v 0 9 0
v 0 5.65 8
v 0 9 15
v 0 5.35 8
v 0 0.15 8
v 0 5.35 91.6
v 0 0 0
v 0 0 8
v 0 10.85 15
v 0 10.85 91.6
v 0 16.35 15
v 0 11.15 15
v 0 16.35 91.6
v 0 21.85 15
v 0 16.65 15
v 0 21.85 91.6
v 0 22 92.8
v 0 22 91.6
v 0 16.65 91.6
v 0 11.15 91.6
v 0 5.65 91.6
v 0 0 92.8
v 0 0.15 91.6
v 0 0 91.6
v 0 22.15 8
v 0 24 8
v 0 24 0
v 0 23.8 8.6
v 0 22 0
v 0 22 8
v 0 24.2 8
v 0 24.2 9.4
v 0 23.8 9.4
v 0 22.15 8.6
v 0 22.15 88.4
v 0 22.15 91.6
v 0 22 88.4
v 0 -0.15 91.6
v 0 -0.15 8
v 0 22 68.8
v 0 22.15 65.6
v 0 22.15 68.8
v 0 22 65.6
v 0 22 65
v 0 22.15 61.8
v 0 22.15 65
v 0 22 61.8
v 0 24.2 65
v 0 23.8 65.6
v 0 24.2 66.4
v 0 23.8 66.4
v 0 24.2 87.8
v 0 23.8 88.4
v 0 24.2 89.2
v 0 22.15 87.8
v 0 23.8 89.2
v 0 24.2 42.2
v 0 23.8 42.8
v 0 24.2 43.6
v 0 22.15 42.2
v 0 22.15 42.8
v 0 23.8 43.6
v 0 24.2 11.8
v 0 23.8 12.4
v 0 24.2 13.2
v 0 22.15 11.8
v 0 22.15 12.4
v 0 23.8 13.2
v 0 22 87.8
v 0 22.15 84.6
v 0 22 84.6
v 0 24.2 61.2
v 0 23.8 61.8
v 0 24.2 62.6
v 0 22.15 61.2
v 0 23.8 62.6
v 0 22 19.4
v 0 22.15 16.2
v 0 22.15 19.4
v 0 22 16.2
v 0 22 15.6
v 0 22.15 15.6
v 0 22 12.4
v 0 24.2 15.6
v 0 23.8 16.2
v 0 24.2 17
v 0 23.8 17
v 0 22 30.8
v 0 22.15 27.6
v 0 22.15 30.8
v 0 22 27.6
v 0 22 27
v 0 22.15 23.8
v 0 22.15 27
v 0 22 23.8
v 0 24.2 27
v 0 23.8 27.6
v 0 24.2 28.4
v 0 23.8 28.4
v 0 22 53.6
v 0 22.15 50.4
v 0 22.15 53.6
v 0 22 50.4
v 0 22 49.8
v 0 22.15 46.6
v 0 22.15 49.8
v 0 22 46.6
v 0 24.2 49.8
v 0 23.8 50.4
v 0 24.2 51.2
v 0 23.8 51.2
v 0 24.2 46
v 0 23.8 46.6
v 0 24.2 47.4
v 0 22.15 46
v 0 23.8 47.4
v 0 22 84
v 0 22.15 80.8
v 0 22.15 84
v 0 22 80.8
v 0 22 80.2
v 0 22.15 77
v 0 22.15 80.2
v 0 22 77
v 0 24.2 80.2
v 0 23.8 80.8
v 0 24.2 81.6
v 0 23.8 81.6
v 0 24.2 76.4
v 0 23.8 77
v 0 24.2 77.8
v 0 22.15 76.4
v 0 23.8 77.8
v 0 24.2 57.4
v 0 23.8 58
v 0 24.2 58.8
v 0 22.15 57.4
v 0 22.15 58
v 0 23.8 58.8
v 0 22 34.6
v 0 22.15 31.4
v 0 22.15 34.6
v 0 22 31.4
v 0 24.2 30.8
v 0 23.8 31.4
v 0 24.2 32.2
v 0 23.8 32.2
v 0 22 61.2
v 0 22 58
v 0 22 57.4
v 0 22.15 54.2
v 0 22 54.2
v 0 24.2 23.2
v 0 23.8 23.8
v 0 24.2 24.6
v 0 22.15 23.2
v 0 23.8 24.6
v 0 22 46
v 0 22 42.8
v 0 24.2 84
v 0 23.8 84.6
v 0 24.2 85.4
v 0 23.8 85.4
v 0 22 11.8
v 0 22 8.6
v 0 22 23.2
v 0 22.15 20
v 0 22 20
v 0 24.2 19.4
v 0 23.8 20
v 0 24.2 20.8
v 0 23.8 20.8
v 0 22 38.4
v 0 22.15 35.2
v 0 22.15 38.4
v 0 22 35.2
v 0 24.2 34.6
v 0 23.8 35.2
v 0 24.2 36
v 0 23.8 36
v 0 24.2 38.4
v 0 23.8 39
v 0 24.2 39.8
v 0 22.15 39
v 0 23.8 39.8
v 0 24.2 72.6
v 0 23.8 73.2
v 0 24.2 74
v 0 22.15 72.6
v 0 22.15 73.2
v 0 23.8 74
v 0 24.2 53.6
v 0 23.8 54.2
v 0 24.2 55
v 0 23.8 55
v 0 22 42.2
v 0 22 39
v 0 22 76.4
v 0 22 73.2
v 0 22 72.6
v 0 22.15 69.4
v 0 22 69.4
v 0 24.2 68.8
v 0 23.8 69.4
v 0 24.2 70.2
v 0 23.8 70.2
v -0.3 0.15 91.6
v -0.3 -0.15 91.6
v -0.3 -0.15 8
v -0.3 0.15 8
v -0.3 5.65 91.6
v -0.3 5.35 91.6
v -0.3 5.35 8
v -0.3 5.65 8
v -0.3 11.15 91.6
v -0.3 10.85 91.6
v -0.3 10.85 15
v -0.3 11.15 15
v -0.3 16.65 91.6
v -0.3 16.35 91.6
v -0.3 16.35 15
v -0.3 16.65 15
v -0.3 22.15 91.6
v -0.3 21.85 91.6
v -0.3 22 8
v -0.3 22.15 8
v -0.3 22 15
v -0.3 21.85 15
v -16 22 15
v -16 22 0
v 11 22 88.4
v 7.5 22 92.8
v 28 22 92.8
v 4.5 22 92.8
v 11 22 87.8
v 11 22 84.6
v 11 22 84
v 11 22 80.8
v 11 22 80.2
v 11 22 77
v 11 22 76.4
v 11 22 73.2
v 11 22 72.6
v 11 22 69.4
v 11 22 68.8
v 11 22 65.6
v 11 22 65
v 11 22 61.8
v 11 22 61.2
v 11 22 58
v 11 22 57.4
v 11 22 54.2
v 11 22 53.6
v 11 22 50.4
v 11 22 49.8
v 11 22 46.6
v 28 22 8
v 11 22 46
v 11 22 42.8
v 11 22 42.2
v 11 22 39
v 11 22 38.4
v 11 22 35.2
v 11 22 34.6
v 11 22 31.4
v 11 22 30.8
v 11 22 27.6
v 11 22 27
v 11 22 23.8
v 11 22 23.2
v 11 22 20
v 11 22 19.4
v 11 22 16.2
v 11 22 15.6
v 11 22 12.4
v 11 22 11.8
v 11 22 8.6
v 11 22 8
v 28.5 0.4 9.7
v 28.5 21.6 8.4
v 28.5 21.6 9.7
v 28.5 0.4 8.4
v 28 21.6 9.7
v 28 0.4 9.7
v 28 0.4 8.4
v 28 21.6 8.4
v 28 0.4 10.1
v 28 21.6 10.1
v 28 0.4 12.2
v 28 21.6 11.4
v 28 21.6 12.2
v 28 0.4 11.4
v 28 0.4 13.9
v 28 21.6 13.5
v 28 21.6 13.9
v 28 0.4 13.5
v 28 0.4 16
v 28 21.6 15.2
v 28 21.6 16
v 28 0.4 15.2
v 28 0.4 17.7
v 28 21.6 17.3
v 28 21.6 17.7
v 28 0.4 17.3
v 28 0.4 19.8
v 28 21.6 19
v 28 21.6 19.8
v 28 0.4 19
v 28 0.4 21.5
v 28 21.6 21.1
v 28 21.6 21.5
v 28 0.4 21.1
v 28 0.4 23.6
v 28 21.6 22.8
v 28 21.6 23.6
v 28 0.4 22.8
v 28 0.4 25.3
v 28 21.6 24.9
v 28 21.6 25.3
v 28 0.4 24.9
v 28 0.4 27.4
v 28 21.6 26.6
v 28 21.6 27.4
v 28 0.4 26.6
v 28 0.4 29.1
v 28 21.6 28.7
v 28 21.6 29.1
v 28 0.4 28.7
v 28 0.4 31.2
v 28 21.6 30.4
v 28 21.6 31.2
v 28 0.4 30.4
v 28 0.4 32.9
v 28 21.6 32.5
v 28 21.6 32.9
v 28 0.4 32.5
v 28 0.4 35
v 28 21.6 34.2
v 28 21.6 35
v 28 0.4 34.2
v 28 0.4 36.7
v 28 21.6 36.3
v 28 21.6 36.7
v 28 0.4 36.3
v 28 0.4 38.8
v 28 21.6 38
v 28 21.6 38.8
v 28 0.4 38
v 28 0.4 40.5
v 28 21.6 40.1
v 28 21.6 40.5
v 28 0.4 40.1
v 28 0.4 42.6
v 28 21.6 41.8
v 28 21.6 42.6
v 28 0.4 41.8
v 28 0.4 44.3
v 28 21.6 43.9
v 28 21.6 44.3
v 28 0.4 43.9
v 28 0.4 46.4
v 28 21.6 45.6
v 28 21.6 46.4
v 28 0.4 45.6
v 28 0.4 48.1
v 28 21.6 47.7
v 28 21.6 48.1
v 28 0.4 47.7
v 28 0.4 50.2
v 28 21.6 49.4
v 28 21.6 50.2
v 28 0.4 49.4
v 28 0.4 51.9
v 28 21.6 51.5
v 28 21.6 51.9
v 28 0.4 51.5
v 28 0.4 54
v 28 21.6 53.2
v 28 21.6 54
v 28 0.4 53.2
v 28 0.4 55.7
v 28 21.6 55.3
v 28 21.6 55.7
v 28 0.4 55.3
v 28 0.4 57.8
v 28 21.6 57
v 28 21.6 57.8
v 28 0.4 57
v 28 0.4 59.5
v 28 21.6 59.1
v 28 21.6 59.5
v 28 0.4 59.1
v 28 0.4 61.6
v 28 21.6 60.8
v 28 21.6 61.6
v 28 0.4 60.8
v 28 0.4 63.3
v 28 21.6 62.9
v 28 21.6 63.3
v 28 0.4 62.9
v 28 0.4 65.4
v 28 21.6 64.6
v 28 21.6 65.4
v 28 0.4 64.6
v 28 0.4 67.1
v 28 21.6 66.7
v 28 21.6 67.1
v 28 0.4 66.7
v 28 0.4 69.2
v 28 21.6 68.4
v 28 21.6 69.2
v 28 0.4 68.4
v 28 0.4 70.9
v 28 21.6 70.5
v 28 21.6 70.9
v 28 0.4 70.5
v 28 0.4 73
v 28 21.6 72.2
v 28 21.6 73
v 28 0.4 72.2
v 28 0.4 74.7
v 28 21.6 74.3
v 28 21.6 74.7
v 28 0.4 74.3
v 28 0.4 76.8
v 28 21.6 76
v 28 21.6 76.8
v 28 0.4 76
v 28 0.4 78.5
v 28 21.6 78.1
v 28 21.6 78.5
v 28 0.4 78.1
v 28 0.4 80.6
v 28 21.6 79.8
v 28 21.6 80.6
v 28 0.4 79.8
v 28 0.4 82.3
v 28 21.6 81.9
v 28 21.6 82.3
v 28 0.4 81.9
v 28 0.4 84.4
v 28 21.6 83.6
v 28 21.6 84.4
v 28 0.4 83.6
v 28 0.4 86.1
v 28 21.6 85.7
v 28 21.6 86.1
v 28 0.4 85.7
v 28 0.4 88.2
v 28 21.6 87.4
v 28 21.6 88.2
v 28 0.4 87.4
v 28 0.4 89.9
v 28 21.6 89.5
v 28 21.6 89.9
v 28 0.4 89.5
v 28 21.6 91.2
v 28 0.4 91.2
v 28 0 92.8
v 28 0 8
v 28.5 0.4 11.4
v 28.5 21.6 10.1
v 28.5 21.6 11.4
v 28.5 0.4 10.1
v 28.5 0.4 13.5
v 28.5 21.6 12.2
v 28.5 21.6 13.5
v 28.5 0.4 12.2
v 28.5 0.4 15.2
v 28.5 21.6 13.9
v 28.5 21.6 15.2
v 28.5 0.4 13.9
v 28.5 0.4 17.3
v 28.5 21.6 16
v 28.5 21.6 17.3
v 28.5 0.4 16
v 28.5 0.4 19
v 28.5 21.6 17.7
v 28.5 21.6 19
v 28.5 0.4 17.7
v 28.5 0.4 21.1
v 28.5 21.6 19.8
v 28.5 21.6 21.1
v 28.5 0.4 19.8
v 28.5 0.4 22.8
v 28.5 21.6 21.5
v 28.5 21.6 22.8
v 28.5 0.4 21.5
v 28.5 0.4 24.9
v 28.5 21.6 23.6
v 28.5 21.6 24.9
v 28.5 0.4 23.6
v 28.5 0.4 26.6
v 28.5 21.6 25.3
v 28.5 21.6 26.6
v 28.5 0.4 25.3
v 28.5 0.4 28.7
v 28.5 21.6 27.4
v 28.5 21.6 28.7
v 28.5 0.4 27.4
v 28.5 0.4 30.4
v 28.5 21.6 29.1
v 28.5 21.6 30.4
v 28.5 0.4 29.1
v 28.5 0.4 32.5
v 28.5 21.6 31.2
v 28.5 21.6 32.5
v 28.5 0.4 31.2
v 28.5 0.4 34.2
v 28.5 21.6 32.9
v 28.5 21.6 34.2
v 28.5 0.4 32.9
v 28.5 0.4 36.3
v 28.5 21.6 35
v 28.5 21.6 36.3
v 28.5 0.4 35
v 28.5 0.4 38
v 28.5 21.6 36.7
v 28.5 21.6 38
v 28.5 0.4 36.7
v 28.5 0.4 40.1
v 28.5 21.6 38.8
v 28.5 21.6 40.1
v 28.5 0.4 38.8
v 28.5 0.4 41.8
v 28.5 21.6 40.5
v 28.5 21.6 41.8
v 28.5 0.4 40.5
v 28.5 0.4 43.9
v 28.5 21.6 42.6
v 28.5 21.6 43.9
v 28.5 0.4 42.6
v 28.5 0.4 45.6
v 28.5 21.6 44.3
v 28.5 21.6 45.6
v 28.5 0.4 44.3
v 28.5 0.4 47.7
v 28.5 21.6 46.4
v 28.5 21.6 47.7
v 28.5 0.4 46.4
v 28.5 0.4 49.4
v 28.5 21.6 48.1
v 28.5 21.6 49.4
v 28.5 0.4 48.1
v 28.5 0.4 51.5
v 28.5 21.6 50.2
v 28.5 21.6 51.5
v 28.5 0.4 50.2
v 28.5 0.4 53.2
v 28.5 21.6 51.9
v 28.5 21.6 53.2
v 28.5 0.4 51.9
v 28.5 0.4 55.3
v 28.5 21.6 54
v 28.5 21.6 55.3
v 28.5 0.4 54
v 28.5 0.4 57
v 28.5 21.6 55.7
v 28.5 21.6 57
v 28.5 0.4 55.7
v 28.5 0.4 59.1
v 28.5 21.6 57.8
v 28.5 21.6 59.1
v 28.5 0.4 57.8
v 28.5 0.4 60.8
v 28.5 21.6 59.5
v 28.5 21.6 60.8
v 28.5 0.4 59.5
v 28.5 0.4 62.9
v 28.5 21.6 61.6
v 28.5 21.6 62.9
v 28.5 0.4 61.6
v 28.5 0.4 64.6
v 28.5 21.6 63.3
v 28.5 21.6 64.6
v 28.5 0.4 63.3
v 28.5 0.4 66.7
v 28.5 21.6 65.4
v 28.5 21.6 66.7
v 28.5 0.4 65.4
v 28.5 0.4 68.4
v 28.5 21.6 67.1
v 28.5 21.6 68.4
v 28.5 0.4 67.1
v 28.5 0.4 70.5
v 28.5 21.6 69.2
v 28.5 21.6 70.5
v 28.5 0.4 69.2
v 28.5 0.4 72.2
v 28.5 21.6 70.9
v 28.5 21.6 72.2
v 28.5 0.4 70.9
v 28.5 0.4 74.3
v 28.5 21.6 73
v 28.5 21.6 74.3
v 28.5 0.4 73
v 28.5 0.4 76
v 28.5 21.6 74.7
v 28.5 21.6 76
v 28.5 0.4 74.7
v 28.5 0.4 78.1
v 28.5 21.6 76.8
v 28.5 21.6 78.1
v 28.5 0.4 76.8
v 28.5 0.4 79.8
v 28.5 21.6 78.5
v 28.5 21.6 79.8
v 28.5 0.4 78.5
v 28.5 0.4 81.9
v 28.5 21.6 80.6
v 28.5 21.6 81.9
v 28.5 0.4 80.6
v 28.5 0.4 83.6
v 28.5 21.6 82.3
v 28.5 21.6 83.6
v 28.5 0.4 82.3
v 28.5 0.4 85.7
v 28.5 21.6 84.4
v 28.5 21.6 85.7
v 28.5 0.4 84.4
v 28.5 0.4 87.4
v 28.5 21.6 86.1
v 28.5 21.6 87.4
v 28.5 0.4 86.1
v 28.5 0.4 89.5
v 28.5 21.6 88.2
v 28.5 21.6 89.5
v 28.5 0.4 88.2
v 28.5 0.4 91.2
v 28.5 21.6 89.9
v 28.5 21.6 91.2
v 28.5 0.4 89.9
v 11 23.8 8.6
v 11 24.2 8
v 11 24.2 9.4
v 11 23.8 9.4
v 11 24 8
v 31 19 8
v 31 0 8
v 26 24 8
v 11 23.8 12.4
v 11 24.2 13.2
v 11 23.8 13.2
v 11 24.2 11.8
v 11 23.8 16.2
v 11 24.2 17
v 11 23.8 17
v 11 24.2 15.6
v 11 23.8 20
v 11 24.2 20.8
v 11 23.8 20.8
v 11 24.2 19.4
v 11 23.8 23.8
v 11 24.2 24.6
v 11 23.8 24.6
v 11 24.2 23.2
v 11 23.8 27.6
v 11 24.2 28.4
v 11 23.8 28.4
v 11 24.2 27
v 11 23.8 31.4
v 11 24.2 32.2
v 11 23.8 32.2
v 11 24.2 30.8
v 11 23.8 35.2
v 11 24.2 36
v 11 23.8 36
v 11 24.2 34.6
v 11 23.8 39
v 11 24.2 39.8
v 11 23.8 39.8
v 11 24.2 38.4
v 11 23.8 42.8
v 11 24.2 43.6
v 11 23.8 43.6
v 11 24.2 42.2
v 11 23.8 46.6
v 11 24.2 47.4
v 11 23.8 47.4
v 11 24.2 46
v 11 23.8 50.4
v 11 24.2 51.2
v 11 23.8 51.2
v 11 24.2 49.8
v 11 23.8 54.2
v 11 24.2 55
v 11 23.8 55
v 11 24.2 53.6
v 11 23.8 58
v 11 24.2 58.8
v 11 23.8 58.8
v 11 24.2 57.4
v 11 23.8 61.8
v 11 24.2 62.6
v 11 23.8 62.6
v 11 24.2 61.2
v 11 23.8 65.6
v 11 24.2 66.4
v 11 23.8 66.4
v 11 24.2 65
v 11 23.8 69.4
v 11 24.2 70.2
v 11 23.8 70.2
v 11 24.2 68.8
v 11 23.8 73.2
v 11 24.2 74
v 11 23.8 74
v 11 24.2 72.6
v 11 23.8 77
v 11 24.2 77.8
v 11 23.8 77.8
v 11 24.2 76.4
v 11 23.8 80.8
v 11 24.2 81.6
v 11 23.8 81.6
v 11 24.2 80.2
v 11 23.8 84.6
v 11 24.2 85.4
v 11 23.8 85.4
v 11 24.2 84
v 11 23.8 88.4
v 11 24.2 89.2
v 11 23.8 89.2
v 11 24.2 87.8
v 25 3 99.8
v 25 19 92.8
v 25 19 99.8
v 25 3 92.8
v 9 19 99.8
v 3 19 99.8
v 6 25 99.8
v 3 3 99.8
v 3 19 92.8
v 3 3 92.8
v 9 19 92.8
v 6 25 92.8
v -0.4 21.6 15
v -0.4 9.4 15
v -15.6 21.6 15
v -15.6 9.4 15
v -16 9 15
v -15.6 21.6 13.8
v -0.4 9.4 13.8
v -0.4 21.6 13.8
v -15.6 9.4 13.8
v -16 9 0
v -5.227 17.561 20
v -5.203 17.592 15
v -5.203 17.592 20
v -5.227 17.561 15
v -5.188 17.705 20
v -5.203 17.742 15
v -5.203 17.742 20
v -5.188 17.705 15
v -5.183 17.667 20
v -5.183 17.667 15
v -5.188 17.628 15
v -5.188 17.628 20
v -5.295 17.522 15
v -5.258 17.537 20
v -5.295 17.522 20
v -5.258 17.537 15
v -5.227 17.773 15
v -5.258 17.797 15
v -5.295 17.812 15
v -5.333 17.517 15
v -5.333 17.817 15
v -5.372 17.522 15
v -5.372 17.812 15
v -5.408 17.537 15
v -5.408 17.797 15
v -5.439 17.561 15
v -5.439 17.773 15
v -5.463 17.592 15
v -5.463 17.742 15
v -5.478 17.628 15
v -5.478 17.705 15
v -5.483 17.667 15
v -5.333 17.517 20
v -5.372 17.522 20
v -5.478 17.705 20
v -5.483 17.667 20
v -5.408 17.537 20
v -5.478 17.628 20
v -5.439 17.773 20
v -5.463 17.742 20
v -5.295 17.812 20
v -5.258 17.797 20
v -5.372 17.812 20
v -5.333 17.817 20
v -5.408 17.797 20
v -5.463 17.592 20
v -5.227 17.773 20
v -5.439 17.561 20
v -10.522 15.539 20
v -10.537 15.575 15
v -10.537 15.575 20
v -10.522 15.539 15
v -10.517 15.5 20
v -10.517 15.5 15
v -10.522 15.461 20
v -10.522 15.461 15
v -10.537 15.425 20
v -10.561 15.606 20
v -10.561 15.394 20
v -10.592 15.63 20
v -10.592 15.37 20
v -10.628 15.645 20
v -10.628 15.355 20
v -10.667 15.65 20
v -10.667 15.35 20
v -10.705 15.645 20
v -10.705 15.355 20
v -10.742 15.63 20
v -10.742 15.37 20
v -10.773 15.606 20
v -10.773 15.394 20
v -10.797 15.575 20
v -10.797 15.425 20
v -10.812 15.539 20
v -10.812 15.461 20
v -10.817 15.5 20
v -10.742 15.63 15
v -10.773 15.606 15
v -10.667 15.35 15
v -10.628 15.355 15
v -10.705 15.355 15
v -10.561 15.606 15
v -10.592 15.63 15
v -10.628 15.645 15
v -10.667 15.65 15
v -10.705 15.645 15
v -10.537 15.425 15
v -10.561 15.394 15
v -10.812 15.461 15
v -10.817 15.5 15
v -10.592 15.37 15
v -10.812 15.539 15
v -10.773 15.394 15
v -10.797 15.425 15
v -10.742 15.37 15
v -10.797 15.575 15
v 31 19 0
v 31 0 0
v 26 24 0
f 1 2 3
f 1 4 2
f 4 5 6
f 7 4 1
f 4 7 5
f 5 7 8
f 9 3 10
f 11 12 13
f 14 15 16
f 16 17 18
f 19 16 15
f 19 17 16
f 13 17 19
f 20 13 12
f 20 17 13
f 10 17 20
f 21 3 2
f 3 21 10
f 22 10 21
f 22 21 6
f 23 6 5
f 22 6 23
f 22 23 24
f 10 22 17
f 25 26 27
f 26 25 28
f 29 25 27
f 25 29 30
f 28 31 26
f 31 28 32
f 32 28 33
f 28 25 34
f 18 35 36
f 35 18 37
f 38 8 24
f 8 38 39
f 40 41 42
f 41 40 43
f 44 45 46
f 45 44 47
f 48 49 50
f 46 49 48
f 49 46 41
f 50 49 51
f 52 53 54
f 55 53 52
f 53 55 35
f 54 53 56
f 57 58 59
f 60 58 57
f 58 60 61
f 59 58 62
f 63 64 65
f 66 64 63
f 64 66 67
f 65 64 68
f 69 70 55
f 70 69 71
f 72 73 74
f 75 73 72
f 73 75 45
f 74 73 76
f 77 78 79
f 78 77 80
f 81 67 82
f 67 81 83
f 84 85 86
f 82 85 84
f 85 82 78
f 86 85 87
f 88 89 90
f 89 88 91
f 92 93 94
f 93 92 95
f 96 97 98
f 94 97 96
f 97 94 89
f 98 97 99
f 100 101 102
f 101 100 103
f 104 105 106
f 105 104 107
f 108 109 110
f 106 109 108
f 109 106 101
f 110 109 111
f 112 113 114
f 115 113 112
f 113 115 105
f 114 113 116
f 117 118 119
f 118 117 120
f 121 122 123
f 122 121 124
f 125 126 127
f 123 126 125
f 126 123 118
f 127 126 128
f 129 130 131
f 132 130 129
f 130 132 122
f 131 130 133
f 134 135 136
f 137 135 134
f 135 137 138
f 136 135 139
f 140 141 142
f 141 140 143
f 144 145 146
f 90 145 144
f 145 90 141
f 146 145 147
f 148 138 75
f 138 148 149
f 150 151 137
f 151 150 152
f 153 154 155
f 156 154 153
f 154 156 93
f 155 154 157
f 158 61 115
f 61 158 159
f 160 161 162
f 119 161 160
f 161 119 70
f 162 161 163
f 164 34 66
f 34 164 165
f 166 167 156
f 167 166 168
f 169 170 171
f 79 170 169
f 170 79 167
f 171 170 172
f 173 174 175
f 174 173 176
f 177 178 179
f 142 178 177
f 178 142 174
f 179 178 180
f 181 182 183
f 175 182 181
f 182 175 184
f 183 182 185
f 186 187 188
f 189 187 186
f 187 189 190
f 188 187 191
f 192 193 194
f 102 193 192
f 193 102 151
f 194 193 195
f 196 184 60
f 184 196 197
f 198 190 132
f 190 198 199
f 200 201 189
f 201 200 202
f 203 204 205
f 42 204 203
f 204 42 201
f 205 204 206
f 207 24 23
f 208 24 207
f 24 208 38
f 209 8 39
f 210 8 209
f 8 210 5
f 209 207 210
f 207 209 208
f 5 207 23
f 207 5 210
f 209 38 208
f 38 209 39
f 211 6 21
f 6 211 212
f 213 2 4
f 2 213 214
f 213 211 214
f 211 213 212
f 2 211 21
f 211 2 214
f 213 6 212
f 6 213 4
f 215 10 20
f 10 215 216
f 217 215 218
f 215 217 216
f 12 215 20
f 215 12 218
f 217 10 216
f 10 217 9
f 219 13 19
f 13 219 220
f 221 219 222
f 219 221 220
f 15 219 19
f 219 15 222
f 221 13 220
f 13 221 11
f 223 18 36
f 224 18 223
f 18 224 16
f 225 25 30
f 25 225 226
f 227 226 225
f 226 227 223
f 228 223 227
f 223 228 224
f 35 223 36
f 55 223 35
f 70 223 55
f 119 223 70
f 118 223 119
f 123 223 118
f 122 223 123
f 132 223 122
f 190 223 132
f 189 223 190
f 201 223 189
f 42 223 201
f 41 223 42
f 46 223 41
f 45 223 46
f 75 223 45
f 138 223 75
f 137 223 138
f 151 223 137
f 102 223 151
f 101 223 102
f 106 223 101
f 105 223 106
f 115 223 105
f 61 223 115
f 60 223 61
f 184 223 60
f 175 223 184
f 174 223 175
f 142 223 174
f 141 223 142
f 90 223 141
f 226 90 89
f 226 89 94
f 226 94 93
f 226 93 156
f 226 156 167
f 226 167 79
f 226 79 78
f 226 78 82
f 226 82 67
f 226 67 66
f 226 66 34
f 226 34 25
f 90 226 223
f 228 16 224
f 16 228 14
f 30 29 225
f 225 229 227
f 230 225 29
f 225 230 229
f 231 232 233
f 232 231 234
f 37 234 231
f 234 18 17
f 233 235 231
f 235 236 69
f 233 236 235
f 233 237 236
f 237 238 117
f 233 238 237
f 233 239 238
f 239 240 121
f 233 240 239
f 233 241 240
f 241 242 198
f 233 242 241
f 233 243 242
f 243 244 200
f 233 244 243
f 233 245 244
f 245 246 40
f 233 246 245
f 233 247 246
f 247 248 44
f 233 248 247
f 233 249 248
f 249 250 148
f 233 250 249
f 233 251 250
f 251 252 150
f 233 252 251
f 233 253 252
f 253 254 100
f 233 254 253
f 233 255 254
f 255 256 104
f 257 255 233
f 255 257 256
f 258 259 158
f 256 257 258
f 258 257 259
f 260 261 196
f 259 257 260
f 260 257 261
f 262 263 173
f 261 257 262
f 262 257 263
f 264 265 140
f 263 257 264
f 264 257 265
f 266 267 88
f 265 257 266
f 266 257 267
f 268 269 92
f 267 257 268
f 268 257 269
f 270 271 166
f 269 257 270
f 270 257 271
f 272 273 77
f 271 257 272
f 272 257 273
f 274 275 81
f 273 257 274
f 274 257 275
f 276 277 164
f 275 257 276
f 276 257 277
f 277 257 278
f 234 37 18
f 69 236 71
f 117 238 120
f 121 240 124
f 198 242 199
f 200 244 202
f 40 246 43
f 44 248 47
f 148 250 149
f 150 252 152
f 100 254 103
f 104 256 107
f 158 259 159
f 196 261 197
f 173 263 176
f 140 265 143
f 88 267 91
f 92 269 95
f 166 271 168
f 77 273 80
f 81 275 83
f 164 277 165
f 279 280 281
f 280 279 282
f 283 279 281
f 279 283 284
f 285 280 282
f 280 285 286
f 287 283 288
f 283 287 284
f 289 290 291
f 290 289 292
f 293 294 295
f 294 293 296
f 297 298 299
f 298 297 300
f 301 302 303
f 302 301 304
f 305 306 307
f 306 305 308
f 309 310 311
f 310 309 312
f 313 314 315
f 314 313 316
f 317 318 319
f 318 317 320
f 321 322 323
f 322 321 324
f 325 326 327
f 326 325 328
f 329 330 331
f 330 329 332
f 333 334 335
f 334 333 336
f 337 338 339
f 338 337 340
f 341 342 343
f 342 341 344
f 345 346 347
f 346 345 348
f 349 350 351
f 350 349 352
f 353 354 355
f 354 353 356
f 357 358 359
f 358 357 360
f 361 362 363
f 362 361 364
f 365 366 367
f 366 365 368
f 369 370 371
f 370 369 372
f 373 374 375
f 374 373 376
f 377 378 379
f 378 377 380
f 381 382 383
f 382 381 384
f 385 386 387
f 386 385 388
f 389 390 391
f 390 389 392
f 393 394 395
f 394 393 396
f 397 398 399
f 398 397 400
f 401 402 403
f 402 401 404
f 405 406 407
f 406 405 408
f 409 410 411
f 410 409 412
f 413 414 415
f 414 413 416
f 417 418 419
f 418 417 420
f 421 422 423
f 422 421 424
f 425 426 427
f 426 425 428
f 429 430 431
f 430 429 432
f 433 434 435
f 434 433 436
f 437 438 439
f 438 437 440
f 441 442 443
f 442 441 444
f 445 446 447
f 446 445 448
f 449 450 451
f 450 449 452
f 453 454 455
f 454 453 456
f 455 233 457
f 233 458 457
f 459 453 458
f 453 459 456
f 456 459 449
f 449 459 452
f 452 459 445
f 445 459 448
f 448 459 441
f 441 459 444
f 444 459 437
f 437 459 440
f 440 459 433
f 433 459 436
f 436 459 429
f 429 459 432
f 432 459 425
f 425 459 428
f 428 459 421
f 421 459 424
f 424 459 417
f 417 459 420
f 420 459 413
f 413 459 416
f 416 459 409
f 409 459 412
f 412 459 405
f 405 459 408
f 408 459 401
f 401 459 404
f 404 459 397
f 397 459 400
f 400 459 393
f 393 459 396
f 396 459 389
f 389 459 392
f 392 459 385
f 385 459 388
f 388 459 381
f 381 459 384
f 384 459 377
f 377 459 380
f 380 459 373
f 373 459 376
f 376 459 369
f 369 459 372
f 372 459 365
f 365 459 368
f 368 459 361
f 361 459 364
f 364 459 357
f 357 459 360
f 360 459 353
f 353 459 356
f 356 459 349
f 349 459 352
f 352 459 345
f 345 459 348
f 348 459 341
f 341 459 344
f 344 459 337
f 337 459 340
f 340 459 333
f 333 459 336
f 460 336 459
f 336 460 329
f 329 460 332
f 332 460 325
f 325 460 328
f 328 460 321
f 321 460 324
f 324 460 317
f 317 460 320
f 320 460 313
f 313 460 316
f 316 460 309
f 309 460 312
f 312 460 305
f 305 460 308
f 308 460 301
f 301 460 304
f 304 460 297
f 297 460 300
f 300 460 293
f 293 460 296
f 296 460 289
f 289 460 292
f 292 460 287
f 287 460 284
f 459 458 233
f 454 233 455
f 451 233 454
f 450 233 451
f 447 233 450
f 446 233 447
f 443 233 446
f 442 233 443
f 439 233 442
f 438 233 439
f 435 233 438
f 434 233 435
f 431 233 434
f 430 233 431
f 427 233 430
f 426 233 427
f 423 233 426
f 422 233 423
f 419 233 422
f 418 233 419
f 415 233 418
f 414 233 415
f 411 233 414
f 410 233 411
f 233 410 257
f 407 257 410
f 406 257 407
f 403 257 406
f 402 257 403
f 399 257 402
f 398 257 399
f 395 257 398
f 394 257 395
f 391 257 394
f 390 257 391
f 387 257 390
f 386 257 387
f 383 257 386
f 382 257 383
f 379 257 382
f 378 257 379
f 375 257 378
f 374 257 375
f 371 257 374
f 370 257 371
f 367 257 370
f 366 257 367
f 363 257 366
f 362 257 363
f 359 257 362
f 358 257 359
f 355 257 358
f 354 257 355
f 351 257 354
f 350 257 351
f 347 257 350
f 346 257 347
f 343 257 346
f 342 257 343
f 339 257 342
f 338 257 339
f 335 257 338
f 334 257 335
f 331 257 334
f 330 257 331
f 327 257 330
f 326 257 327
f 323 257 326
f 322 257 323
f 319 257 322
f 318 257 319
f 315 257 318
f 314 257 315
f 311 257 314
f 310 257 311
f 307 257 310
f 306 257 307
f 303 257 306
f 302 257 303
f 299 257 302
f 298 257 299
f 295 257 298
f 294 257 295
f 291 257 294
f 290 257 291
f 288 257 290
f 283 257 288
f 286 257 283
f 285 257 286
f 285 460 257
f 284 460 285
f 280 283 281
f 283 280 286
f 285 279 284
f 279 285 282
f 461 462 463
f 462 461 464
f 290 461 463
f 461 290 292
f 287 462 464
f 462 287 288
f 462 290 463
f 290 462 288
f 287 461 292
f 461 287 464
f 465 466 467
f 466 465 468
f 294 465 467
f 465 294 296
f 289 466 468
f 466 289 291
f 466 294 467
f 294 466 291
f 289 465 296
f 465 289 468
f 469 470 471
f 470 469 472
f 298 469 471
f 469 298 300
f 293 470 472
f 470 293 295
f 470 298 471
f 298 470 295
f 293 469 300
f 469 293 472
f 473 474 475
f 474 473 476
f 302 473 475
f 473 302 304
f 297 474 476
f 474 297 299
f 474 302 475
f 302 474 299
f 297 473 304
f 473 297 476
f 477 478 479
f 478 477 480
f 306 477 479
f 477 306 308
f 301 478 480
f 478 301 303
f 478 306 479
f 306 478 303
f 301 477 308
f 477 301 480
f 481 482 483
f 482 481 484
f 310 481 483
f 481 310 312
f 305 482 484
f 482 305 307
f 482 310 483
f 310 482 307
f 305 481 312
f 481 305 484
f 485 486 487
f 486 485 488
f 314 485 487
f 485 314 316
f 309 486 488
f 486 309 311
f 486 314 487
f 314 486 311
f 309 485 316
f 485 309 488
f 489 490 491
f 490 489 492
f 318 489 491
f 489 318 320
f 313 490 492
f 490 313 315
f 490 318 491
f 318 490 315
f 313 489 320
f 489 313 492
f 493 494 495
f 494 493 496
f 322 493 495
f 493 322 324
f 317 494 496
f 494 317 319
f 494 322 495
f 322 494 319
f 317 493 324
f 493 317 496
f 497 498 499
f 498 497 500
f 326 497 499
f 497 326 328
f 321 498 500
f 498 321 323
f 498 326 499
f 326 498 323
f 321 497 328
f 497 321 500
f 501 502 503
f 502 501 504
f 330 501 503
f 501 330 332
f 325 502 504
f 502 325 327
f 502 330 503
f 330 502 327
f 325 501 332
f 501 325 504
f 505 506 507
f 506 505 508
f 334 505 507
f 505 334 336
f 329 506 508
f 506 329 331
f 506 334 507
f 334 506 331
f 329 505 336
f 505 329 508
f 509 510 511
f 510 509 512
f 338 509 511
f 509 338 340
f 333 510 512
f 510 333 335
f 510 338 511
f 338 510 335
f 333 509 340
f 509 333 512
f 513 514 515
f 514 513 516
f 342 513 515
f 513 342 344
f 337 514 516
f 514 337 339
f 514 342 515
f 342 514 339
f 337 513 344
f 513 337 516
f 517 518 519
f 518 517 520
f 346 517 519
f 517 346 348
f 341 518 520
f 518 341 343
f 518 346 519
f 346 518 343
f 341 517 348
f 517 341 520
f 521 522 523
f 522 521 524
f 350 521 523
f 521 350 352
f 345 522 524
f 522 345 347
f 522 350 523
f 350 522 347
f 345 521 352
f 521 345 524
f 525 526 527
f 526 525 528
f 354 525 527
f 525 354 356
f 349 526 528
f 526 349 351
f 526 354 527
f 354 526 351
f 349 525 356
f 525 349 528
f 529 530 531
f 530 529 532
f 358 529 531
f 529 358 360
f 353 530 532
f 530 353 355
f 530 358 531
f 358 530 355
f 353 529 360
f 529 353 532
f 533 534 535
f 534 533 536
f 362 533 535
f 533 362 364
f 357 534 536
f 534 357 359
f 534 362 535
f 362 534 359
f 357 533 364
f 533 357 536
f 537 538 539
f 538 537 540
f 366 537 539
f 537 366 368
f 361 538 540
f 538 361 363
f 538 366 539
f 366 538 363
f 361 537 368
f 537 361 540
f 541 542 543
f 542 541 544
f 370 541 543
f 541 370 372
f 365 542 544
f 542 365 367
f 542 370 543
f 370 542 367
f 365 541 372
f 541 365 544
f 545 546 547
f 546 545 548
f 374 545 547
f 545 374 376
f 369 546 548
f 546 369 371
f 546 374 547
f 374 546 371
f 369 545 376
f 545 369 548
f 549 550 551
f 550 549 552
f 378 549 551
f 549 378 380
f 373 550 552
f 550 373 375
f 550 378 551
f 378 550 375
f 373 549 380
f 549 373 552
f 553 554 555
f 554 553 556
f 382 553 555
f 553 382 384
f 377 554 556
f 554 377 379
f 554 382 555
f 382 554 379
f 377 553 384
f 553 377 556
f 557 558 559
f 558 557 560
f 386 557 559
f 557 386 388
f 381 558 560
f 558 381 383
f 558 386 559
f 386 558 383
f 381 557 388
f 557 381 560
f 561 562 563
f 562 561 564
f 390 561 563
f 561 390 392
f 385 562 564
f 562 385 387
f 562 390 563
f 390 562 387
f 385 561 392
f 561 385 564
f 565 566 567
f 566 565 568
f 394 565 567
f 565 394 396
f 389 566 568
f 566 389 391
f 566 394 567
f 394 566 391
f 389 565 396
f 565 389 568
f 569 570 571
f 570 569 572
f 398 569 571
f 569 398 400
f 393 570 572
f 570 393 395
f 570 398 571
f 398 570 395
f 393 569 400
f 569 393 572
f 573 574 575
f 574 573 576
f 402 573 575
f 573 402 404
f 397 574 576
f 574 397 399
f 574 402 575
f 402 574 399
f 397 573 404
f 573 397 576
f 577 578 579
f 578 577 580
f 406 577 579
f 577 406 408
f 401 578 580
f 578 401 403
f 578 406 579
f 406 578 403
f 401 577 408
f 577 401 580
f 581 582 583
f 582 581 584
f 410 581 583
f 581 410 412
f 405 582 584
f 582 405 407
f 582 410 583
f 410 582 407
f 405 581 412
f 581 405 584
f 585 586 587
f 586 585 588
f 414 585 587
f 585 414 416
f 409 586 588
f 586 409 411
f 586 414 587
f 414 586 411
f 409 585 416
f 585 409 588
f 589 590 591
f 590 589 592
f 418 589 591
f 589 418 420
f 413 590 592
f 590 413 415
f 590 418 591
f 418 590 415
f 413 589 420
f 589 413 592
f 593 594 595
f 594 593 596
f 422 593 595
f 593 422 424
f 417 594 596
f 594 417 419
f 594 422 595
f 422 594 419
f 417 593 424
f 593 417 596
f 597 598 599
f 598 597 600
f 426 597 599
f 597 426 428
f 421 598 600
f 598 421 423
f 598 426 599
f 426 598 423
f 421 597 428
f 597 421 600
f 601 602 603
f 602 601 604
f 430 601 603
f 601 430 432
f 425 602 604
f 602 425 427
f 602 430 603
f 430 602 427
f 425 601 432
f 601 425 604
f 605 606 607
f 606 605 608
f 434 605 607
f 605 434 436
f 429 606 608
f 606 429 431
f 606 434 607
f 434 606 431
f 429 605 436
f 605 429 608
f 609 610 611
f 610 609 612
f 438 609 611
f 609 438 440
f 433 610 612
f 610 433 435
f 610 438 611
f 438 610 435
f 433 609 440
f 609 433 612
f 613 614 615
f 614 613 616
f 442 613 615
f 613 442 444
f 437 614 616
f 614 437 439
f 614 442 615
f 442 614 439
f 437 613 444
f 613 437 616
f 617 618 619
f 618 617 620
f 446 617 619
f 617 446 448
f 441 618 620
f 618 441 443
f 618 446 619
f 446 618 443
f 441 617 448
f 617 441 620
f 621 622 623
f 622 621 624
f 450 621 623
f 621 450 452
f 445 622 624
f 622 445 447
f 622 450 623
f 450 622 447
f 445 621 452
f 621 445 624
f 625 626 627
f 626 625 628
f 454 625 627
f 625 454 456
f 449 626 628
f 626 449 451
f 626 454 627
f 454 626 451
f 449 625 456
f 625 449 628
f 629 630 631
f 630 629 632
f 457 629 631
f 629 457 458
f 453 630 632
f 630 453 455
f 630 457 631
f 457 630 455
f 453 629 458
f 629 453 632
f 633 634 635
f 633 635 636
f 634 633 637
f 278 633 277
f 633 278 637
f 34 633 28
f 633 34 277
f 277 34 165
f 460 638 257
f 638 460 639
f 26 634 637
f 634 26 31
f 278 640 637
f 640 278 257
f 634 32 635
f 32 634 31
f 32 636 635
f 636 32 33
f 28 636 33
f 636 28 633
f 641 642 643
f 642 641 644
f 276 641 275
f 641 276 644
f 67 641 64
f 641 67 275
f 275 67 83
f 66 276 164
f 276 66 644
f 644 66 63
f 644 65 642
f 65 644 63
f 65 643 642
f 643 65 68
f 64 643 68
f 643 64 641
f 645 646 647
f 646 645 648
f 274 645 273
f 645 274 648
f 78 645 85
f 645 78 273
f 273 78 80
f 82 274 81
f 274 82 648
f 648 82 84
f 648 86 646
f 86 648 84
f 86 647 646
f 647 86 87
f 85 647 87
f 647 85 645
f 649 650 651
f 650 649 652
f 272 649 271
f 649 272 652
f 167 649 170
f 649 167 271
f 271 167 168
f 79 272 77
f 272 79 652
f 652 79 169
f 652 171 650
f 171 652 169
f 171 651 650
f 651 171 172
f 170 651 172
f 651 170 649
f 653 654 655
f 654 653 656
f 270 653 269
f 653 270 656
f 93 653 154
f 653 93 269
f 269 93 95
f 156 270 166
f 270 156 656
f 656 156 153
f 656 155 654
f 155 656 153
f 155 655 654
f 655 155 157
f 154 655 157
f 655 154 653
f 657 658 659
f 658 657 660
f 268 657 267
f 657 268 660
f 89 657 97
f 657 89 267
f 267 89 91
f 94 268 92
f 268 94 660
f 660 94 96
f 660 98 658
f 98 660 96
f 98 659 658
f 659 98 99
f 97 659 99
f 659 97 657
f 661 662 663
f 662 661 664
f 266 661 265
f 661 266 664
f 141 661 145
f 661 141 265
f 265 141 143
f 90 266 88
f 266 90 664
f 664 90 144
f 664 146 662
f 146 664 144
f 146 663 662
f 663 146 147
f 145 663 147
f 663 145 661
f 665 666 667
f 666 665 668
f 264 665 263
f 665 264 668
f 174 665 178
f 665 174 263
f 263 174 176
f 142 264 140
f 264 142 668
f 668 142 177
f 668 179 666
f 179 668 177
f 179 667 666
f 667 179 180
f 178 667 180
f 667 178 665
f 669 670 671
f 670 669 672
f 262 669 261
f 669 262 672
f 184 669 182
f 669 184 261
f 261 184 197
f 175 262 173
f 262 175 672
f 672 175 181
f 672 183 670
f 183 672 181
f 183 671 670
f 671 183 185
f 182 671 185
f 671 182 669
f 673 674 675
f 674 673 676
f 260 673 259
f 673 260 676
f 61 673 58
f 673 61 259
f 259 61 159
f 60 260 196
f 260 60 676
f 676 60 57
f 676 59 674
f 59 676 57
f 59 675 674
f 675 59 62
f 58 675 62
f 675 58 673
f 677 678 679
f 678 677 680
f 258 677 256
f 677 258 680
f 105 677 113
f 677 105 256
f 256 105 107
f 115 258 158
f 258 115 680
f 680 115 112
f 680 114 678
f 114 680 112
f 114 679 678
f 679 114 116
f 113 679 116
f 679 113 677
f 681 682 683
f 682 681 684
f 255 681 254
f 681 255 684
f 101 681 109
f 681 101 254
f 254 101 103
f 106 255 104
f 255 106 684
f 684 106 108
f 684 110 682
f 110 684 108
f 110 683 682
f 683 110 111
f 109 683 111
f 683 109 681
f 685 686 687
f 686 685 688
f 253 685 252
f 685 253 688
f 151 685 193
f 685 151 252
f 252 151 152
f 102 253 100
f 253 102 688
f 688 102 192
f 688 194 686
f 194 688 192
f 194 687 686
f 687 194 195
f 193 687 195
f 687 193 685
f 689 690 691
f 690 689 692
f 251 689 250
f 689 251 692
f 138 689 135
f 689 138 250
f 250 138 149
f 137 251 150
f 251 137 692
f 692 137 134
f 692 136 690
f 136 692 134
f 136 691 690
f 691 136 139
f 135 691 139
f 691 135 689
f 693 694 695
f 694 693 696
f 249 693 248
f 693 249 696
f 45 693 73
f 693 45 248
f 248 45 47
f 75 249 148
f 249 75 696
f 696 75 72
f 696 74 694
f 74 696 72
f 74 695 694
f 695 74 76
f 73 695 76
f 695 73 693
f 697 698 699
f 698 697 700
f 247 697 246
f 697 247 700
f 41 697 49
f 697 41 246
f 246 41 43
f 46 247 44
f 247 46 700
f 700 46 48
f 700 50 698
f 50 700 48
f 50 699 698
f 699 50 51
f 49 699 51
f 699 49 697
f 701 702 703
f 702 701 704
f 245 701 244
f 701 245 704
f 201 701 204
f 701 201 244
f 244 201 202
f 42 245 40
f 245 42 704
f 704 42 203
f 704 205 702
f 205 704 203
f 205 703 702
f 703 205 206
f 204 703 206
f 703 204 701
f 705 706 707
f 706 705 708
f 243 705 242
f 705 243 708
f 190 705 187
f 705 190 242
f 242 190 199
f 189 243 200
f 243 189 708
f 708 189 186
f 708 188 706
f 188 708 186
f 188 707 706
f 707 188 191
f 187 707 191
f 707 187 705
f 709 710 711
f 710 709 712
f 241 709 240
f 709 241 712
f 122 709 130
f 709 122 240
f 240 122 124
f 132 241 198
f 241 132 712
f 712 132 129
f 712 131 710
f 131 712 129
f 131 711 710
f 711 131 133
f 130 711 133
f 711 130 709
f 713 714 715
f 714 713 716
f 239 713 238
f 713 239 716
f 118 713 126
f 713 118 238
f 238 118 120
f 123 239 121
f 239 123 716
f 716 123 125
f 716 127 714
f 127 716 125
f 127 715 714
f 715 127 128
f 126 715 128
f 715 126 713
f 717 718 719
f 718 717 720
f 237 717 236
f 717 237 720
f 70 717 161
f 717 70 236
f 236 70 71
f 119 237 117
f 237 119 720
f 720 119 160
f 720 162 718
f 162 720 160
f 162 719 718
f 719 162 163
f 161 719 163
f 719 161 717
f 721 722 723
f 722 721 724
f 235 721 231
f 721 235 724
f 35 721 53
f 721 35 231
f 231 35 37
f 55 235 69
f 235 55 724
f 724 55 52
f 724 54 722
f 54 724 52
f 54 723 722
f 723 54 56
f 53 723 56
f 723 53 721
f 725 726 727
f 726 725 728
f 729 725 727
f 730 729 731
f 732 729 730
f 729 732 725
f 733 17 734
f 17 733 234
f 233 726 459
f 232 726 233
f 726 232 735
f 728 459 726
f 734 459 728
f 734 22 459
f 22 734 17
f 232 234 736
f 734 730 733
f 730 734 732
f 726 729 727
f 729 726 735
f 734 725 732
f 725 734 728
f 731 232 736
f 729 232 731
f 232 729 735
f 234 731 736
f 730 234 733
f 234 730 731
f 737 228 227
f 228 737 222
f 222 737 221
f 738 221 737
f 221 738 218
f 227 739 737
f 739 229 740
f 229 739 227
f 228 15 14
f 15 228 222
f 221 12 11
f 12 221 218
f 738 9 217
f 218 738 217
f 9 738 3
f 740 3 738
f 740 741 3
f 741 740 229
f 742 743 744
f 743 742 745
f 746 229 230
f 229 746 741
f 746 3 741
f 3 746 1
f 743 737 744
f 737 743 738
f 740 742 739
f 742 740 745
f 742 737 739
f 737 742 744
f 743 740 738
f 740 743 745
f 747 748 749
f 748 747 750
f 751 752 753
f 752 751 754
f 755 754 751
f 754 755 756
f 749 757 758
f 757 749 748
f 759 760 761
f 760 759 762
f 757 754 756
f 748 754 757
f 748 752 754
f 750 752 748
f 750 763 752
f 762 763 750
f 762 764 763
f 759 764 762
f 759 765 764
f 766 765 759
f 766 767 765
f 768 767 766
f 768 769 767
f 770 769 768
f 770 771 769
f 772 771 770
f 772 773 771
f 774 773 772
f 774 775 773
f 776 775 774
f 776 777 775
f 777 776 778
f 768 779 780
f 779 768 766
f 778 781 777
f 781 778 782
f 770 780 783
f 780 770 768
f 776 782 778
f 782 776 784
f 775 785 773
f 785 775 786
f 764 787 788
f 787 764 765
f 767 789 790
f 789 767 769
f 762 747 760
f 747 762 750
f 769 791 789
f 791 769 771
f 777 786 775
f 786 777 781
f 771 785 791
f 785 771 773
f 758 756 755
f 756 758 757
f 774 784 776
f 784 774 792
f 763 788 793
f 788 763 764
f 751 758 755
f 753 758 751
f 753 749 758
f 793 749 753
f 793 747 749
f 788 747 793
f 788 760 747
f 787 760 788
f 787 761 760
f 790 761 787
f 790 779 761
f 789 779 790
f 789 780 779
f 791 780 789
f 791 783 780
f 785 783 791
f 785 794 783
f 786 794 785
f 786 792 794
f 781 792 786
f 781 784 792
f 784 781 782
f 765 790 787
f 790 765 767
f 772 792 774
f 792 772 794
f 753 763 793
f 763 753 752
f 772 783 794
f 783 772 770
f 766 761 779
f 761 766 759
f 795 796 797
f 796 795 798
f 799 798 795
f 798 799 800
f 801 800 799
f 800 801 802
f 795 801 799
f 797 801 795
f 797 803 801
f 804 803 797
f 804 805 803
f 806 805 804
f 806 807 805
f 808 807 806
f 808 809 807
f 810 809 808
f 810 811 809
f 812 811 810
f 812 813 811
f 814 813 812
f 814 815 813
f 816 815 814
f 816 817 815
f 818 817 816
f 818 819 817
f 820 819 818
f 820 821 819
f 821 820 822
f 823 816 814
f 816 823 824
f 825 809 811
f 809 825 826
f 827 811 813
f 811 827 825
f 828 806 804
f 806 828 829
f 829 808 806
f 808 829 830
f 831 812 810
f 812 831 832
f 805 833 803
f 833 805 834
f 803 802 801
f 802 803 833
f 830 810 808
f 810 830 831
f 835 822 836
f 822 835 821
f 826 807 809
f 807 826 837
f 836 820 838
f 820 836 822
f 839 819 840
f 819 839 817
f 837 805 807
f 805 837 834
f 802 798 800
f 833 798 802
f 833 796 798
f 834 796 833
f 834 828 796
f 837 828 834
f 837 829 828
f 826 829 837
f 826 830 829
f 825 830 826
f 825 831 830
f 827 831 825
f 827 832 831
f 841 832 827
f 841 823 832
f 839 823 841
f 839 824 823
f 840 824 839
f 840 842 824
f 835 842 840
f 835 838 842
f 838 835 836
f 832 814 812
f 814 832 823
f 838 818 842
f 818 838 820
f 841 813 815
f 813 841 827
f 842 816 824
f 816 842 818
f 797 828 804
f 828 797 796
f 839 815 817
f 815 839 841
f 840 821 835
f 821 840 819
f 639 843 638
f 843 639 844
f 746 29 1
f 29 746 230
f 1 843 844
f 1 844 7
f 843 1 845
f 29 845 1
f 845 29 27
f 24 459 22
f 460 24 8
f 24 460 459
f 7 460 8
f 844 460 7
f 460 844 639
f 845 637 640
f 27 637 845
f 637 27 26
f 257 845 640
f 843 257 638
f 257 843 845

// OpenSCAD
// ==============================================
// Parametric Skyscraper Model
// Matches the reference isometric drawing
// ==============================================
// Overall dimensions
tower_w = 28;           // Main tower width (X axis)
tower_d = 22;           // Main tower depth (Y axis)
plinth_h = 8;           // Height of solid base plinth
floor_h = 3.8;          // Height per residential floor
num_floors = 22;        // Number of floors above plinth
balcony_w = 11;         // Width of balcony section on front facade
balcony_proj = 2.2;     // How far balconies project forward from wall
balcony_slab_t = 0.6;   // Thickness of balcony floor slabs
balcony_rail_h = 0.8;   // Height of balcony front railing
window_recess = 0.5;    // Depth windows are recessed into walls
win_frame_t = 0.4;      // Thickness of window frame mullions
plinth_extend_x = 3;    // Plinth extension on right side
plinth_extend_y = 2;    // Plinth extension on front side
plinth_chamfer = 5;     // Size of 45deg chamfer on plinth corner
roof_slab_t = 1.2;      // Thickness of main roof slab
penthouse_h = 7;        // Height of upper penthouse parapet
penthouse_setback = 3;  // Setback of penthouse from tower edges
tri_pent_size = 6;      // Size of triangular penthouse roof feature
annex_w = 16;           // Width of side annex building
annex_d = 13;           // Depth of side annex building
annex_h = 15;           // Total height of annex
annex_parapet_h = 1.2;  // Height of parapet wall on annex roof
antenna_h = 5;          // Height of roof antennas
antenna_r = 0.15;       // Radius of antenna rods
num_fins = 5;           // Number of vertical fins on left edge
$fn = 24;               // Resolution for curved geometry

// Calculated heights
main_wall_h = plinth_h + num_floors * floor_h;
main_roof_z = main_wall_h + roof_slab_t;
penthouse_z = main_roof_z + penthouse_h;

// ==============================================
// Plinth (solid chamfered base)
// ==============================================
color("lightgray") linear_extrude(height=plinth_h)
polygon(points=[
    [0, 0],
    [tower_w + plinth_extend_x, 0],
    [tower_w + plinth_extend_x, tower_d + plinth_extend_y - plinth_chamfer],
    [tower_w + plinth_extend_x - plinth_chamfer, tower_d + plinth_extend_y],
    [0, tower_d + plinth_extend_y]
]);

// ==============================================
// Main tower structural wall
// ==============================================
color("lightgray")
translate([0, 0, plinth_h])
    cube([tower_w, tower_d, main_wall_h - plinth_h]);

// ==============================================
// Vertical fins on left tower edge
// ==============================================
color("lightgray")
for (i = [0:num_fins-1]) {
    y_pos = i * (tower_d / (num_fins-1));
    translate([-0.3, y_pos - 0.15, plinth_h])
        cube([0.3, 0.3, main_wall_h - plinth_h]);
}

// ==============================================
// Facade windows (dark recessed glazing)
// ==============================================
color("darkgray")
for (floor_i = [0:num_floors-1]) {
    z_base = plinth_h + floor_i * floor_h;

    // 1. Dark glazing behind balconies (front left)
    translate([win_frame_t, tower_d - window_recess, z_base + balcony_slab_t])
        cube([balcony_w - 2*win_frame_t, window_recess, floor_h - balcony_slab_t - win_frame_t]);

    // 2. Grid windows (front right: 3 columns x 2 rows per floor)
    grid_section_w = tower_w - balcony_w;
    col_w = grid_section_w / 3;
    row_h = floor_h / 2;
    for (col = [0:2]) {
        for (row = [0:1]) {
            x_pos = balcony_w + col * col_w + win_frame_t;
            z_pos = z_base + row * row_h + win_frame_t;
            translate([x_pos, tower_d - window_recess, z_pos])
                cube([col_w - 2*win_frame_t, window_recess, row_h - 2*win_frame_t]);
        }
    }

    // 3. Long horizontal windows (right side face: 2 per floor)
    win_h = (floor_h - win_frame_t*3)/2;
    for (row = [0:1]) {
        z_pos = z_base + win_frame_t + row*(win_h + win_frame_t);
        translate([tower_w, win_frame_t, z_pos])
            cube([window_recess, tower_d - 2*win_frame_t, win_h]);
    }
}

// ==============================================
// Projecting balconies on front facade
// ==============================================
color("lightgray")
for (floor_i = [0:num_floors-1]) {
    z_base = plinth_h + floor_i * floor_h;
    // Balcony floor slab
    translate([0, tower_d, z_base])
        cube([balcony_w, balcony_proj, balcony_slab_t]);
    // Balcony front railing
    translate([0, tower_d + balcony_proj - win_frame_t, z_base + balcony_slab_t])
        cube([balcony_w, win_frame_t, balcony_rail_h]);
}

// ==============================================
// Main roof slab
// ==============================================
color("gray")
translate([0, 0, main_wall_h])
    cube([tower_w, tower_d, roof_slab_t]);

// ==============================================
// Upper penthouse/parapet level
// ==============================================
color("lightgray") {
    // Rectangular main penthouse section
    translate([penthouse_setback, penthouse_setback, main_roof_z])
        cube([
            tower_w - 2*penthouse_setback,
            tower_d - 2*penthouse_setback,
            penthouse_h
        ]);
    // Triangular front feature
    translate([0, 0, main_roof_z])
    linear_extrude(height=penthouse_h)
    polygon(points=[
        [penthouse_setback, tower_d - penthouse_setback],
        [penthouse_setback + tri_pent_size, tower_d - penthouse_setback],
        [penthouse_setback + tri_pent_size/2, tower_d - penthouse_setback + tri_pent_size]
    ]);
}

// ==============================================
// Side annex building
// ==============================================
// Main annex structure
color("lightgray")
translate([-annex_w, tower_d - annex_d, 0])
    cube([annex_w, annex_d, annex_h - annex_parapet_h]);

// Annex roof parapet
color("lightgray")
difference() {
    translate([-annex_w, tower_d - annex_d, annex_h - annex_parapet_h])
        cube([annex_w, annex_d, annex_parapet_h]);
    translate([-annex_w + win_frame_t, tower_d - annex_d + win_frame_t, annex_h - annex_parapet_h])
        cube([annex_w - 2*win_frame_t, annex_d - 2*win_frame_t, annex_parapet_h + 1]);
}

// Roof antennas on annex
color("darkgray") {
    translate([-annex_w/3, tower_d - annex_d/3, annex_h])
        cylinder(h=antenna_h, r=antenna_r);
    translate([-annex_w*2/3, tower_d - annex_d/2, annex_h])
        cylinder(h=antenna_h, r=antenna_r);
}

// Rotate to match reference isometric view orientation
rotate([0,0,0])
children();
